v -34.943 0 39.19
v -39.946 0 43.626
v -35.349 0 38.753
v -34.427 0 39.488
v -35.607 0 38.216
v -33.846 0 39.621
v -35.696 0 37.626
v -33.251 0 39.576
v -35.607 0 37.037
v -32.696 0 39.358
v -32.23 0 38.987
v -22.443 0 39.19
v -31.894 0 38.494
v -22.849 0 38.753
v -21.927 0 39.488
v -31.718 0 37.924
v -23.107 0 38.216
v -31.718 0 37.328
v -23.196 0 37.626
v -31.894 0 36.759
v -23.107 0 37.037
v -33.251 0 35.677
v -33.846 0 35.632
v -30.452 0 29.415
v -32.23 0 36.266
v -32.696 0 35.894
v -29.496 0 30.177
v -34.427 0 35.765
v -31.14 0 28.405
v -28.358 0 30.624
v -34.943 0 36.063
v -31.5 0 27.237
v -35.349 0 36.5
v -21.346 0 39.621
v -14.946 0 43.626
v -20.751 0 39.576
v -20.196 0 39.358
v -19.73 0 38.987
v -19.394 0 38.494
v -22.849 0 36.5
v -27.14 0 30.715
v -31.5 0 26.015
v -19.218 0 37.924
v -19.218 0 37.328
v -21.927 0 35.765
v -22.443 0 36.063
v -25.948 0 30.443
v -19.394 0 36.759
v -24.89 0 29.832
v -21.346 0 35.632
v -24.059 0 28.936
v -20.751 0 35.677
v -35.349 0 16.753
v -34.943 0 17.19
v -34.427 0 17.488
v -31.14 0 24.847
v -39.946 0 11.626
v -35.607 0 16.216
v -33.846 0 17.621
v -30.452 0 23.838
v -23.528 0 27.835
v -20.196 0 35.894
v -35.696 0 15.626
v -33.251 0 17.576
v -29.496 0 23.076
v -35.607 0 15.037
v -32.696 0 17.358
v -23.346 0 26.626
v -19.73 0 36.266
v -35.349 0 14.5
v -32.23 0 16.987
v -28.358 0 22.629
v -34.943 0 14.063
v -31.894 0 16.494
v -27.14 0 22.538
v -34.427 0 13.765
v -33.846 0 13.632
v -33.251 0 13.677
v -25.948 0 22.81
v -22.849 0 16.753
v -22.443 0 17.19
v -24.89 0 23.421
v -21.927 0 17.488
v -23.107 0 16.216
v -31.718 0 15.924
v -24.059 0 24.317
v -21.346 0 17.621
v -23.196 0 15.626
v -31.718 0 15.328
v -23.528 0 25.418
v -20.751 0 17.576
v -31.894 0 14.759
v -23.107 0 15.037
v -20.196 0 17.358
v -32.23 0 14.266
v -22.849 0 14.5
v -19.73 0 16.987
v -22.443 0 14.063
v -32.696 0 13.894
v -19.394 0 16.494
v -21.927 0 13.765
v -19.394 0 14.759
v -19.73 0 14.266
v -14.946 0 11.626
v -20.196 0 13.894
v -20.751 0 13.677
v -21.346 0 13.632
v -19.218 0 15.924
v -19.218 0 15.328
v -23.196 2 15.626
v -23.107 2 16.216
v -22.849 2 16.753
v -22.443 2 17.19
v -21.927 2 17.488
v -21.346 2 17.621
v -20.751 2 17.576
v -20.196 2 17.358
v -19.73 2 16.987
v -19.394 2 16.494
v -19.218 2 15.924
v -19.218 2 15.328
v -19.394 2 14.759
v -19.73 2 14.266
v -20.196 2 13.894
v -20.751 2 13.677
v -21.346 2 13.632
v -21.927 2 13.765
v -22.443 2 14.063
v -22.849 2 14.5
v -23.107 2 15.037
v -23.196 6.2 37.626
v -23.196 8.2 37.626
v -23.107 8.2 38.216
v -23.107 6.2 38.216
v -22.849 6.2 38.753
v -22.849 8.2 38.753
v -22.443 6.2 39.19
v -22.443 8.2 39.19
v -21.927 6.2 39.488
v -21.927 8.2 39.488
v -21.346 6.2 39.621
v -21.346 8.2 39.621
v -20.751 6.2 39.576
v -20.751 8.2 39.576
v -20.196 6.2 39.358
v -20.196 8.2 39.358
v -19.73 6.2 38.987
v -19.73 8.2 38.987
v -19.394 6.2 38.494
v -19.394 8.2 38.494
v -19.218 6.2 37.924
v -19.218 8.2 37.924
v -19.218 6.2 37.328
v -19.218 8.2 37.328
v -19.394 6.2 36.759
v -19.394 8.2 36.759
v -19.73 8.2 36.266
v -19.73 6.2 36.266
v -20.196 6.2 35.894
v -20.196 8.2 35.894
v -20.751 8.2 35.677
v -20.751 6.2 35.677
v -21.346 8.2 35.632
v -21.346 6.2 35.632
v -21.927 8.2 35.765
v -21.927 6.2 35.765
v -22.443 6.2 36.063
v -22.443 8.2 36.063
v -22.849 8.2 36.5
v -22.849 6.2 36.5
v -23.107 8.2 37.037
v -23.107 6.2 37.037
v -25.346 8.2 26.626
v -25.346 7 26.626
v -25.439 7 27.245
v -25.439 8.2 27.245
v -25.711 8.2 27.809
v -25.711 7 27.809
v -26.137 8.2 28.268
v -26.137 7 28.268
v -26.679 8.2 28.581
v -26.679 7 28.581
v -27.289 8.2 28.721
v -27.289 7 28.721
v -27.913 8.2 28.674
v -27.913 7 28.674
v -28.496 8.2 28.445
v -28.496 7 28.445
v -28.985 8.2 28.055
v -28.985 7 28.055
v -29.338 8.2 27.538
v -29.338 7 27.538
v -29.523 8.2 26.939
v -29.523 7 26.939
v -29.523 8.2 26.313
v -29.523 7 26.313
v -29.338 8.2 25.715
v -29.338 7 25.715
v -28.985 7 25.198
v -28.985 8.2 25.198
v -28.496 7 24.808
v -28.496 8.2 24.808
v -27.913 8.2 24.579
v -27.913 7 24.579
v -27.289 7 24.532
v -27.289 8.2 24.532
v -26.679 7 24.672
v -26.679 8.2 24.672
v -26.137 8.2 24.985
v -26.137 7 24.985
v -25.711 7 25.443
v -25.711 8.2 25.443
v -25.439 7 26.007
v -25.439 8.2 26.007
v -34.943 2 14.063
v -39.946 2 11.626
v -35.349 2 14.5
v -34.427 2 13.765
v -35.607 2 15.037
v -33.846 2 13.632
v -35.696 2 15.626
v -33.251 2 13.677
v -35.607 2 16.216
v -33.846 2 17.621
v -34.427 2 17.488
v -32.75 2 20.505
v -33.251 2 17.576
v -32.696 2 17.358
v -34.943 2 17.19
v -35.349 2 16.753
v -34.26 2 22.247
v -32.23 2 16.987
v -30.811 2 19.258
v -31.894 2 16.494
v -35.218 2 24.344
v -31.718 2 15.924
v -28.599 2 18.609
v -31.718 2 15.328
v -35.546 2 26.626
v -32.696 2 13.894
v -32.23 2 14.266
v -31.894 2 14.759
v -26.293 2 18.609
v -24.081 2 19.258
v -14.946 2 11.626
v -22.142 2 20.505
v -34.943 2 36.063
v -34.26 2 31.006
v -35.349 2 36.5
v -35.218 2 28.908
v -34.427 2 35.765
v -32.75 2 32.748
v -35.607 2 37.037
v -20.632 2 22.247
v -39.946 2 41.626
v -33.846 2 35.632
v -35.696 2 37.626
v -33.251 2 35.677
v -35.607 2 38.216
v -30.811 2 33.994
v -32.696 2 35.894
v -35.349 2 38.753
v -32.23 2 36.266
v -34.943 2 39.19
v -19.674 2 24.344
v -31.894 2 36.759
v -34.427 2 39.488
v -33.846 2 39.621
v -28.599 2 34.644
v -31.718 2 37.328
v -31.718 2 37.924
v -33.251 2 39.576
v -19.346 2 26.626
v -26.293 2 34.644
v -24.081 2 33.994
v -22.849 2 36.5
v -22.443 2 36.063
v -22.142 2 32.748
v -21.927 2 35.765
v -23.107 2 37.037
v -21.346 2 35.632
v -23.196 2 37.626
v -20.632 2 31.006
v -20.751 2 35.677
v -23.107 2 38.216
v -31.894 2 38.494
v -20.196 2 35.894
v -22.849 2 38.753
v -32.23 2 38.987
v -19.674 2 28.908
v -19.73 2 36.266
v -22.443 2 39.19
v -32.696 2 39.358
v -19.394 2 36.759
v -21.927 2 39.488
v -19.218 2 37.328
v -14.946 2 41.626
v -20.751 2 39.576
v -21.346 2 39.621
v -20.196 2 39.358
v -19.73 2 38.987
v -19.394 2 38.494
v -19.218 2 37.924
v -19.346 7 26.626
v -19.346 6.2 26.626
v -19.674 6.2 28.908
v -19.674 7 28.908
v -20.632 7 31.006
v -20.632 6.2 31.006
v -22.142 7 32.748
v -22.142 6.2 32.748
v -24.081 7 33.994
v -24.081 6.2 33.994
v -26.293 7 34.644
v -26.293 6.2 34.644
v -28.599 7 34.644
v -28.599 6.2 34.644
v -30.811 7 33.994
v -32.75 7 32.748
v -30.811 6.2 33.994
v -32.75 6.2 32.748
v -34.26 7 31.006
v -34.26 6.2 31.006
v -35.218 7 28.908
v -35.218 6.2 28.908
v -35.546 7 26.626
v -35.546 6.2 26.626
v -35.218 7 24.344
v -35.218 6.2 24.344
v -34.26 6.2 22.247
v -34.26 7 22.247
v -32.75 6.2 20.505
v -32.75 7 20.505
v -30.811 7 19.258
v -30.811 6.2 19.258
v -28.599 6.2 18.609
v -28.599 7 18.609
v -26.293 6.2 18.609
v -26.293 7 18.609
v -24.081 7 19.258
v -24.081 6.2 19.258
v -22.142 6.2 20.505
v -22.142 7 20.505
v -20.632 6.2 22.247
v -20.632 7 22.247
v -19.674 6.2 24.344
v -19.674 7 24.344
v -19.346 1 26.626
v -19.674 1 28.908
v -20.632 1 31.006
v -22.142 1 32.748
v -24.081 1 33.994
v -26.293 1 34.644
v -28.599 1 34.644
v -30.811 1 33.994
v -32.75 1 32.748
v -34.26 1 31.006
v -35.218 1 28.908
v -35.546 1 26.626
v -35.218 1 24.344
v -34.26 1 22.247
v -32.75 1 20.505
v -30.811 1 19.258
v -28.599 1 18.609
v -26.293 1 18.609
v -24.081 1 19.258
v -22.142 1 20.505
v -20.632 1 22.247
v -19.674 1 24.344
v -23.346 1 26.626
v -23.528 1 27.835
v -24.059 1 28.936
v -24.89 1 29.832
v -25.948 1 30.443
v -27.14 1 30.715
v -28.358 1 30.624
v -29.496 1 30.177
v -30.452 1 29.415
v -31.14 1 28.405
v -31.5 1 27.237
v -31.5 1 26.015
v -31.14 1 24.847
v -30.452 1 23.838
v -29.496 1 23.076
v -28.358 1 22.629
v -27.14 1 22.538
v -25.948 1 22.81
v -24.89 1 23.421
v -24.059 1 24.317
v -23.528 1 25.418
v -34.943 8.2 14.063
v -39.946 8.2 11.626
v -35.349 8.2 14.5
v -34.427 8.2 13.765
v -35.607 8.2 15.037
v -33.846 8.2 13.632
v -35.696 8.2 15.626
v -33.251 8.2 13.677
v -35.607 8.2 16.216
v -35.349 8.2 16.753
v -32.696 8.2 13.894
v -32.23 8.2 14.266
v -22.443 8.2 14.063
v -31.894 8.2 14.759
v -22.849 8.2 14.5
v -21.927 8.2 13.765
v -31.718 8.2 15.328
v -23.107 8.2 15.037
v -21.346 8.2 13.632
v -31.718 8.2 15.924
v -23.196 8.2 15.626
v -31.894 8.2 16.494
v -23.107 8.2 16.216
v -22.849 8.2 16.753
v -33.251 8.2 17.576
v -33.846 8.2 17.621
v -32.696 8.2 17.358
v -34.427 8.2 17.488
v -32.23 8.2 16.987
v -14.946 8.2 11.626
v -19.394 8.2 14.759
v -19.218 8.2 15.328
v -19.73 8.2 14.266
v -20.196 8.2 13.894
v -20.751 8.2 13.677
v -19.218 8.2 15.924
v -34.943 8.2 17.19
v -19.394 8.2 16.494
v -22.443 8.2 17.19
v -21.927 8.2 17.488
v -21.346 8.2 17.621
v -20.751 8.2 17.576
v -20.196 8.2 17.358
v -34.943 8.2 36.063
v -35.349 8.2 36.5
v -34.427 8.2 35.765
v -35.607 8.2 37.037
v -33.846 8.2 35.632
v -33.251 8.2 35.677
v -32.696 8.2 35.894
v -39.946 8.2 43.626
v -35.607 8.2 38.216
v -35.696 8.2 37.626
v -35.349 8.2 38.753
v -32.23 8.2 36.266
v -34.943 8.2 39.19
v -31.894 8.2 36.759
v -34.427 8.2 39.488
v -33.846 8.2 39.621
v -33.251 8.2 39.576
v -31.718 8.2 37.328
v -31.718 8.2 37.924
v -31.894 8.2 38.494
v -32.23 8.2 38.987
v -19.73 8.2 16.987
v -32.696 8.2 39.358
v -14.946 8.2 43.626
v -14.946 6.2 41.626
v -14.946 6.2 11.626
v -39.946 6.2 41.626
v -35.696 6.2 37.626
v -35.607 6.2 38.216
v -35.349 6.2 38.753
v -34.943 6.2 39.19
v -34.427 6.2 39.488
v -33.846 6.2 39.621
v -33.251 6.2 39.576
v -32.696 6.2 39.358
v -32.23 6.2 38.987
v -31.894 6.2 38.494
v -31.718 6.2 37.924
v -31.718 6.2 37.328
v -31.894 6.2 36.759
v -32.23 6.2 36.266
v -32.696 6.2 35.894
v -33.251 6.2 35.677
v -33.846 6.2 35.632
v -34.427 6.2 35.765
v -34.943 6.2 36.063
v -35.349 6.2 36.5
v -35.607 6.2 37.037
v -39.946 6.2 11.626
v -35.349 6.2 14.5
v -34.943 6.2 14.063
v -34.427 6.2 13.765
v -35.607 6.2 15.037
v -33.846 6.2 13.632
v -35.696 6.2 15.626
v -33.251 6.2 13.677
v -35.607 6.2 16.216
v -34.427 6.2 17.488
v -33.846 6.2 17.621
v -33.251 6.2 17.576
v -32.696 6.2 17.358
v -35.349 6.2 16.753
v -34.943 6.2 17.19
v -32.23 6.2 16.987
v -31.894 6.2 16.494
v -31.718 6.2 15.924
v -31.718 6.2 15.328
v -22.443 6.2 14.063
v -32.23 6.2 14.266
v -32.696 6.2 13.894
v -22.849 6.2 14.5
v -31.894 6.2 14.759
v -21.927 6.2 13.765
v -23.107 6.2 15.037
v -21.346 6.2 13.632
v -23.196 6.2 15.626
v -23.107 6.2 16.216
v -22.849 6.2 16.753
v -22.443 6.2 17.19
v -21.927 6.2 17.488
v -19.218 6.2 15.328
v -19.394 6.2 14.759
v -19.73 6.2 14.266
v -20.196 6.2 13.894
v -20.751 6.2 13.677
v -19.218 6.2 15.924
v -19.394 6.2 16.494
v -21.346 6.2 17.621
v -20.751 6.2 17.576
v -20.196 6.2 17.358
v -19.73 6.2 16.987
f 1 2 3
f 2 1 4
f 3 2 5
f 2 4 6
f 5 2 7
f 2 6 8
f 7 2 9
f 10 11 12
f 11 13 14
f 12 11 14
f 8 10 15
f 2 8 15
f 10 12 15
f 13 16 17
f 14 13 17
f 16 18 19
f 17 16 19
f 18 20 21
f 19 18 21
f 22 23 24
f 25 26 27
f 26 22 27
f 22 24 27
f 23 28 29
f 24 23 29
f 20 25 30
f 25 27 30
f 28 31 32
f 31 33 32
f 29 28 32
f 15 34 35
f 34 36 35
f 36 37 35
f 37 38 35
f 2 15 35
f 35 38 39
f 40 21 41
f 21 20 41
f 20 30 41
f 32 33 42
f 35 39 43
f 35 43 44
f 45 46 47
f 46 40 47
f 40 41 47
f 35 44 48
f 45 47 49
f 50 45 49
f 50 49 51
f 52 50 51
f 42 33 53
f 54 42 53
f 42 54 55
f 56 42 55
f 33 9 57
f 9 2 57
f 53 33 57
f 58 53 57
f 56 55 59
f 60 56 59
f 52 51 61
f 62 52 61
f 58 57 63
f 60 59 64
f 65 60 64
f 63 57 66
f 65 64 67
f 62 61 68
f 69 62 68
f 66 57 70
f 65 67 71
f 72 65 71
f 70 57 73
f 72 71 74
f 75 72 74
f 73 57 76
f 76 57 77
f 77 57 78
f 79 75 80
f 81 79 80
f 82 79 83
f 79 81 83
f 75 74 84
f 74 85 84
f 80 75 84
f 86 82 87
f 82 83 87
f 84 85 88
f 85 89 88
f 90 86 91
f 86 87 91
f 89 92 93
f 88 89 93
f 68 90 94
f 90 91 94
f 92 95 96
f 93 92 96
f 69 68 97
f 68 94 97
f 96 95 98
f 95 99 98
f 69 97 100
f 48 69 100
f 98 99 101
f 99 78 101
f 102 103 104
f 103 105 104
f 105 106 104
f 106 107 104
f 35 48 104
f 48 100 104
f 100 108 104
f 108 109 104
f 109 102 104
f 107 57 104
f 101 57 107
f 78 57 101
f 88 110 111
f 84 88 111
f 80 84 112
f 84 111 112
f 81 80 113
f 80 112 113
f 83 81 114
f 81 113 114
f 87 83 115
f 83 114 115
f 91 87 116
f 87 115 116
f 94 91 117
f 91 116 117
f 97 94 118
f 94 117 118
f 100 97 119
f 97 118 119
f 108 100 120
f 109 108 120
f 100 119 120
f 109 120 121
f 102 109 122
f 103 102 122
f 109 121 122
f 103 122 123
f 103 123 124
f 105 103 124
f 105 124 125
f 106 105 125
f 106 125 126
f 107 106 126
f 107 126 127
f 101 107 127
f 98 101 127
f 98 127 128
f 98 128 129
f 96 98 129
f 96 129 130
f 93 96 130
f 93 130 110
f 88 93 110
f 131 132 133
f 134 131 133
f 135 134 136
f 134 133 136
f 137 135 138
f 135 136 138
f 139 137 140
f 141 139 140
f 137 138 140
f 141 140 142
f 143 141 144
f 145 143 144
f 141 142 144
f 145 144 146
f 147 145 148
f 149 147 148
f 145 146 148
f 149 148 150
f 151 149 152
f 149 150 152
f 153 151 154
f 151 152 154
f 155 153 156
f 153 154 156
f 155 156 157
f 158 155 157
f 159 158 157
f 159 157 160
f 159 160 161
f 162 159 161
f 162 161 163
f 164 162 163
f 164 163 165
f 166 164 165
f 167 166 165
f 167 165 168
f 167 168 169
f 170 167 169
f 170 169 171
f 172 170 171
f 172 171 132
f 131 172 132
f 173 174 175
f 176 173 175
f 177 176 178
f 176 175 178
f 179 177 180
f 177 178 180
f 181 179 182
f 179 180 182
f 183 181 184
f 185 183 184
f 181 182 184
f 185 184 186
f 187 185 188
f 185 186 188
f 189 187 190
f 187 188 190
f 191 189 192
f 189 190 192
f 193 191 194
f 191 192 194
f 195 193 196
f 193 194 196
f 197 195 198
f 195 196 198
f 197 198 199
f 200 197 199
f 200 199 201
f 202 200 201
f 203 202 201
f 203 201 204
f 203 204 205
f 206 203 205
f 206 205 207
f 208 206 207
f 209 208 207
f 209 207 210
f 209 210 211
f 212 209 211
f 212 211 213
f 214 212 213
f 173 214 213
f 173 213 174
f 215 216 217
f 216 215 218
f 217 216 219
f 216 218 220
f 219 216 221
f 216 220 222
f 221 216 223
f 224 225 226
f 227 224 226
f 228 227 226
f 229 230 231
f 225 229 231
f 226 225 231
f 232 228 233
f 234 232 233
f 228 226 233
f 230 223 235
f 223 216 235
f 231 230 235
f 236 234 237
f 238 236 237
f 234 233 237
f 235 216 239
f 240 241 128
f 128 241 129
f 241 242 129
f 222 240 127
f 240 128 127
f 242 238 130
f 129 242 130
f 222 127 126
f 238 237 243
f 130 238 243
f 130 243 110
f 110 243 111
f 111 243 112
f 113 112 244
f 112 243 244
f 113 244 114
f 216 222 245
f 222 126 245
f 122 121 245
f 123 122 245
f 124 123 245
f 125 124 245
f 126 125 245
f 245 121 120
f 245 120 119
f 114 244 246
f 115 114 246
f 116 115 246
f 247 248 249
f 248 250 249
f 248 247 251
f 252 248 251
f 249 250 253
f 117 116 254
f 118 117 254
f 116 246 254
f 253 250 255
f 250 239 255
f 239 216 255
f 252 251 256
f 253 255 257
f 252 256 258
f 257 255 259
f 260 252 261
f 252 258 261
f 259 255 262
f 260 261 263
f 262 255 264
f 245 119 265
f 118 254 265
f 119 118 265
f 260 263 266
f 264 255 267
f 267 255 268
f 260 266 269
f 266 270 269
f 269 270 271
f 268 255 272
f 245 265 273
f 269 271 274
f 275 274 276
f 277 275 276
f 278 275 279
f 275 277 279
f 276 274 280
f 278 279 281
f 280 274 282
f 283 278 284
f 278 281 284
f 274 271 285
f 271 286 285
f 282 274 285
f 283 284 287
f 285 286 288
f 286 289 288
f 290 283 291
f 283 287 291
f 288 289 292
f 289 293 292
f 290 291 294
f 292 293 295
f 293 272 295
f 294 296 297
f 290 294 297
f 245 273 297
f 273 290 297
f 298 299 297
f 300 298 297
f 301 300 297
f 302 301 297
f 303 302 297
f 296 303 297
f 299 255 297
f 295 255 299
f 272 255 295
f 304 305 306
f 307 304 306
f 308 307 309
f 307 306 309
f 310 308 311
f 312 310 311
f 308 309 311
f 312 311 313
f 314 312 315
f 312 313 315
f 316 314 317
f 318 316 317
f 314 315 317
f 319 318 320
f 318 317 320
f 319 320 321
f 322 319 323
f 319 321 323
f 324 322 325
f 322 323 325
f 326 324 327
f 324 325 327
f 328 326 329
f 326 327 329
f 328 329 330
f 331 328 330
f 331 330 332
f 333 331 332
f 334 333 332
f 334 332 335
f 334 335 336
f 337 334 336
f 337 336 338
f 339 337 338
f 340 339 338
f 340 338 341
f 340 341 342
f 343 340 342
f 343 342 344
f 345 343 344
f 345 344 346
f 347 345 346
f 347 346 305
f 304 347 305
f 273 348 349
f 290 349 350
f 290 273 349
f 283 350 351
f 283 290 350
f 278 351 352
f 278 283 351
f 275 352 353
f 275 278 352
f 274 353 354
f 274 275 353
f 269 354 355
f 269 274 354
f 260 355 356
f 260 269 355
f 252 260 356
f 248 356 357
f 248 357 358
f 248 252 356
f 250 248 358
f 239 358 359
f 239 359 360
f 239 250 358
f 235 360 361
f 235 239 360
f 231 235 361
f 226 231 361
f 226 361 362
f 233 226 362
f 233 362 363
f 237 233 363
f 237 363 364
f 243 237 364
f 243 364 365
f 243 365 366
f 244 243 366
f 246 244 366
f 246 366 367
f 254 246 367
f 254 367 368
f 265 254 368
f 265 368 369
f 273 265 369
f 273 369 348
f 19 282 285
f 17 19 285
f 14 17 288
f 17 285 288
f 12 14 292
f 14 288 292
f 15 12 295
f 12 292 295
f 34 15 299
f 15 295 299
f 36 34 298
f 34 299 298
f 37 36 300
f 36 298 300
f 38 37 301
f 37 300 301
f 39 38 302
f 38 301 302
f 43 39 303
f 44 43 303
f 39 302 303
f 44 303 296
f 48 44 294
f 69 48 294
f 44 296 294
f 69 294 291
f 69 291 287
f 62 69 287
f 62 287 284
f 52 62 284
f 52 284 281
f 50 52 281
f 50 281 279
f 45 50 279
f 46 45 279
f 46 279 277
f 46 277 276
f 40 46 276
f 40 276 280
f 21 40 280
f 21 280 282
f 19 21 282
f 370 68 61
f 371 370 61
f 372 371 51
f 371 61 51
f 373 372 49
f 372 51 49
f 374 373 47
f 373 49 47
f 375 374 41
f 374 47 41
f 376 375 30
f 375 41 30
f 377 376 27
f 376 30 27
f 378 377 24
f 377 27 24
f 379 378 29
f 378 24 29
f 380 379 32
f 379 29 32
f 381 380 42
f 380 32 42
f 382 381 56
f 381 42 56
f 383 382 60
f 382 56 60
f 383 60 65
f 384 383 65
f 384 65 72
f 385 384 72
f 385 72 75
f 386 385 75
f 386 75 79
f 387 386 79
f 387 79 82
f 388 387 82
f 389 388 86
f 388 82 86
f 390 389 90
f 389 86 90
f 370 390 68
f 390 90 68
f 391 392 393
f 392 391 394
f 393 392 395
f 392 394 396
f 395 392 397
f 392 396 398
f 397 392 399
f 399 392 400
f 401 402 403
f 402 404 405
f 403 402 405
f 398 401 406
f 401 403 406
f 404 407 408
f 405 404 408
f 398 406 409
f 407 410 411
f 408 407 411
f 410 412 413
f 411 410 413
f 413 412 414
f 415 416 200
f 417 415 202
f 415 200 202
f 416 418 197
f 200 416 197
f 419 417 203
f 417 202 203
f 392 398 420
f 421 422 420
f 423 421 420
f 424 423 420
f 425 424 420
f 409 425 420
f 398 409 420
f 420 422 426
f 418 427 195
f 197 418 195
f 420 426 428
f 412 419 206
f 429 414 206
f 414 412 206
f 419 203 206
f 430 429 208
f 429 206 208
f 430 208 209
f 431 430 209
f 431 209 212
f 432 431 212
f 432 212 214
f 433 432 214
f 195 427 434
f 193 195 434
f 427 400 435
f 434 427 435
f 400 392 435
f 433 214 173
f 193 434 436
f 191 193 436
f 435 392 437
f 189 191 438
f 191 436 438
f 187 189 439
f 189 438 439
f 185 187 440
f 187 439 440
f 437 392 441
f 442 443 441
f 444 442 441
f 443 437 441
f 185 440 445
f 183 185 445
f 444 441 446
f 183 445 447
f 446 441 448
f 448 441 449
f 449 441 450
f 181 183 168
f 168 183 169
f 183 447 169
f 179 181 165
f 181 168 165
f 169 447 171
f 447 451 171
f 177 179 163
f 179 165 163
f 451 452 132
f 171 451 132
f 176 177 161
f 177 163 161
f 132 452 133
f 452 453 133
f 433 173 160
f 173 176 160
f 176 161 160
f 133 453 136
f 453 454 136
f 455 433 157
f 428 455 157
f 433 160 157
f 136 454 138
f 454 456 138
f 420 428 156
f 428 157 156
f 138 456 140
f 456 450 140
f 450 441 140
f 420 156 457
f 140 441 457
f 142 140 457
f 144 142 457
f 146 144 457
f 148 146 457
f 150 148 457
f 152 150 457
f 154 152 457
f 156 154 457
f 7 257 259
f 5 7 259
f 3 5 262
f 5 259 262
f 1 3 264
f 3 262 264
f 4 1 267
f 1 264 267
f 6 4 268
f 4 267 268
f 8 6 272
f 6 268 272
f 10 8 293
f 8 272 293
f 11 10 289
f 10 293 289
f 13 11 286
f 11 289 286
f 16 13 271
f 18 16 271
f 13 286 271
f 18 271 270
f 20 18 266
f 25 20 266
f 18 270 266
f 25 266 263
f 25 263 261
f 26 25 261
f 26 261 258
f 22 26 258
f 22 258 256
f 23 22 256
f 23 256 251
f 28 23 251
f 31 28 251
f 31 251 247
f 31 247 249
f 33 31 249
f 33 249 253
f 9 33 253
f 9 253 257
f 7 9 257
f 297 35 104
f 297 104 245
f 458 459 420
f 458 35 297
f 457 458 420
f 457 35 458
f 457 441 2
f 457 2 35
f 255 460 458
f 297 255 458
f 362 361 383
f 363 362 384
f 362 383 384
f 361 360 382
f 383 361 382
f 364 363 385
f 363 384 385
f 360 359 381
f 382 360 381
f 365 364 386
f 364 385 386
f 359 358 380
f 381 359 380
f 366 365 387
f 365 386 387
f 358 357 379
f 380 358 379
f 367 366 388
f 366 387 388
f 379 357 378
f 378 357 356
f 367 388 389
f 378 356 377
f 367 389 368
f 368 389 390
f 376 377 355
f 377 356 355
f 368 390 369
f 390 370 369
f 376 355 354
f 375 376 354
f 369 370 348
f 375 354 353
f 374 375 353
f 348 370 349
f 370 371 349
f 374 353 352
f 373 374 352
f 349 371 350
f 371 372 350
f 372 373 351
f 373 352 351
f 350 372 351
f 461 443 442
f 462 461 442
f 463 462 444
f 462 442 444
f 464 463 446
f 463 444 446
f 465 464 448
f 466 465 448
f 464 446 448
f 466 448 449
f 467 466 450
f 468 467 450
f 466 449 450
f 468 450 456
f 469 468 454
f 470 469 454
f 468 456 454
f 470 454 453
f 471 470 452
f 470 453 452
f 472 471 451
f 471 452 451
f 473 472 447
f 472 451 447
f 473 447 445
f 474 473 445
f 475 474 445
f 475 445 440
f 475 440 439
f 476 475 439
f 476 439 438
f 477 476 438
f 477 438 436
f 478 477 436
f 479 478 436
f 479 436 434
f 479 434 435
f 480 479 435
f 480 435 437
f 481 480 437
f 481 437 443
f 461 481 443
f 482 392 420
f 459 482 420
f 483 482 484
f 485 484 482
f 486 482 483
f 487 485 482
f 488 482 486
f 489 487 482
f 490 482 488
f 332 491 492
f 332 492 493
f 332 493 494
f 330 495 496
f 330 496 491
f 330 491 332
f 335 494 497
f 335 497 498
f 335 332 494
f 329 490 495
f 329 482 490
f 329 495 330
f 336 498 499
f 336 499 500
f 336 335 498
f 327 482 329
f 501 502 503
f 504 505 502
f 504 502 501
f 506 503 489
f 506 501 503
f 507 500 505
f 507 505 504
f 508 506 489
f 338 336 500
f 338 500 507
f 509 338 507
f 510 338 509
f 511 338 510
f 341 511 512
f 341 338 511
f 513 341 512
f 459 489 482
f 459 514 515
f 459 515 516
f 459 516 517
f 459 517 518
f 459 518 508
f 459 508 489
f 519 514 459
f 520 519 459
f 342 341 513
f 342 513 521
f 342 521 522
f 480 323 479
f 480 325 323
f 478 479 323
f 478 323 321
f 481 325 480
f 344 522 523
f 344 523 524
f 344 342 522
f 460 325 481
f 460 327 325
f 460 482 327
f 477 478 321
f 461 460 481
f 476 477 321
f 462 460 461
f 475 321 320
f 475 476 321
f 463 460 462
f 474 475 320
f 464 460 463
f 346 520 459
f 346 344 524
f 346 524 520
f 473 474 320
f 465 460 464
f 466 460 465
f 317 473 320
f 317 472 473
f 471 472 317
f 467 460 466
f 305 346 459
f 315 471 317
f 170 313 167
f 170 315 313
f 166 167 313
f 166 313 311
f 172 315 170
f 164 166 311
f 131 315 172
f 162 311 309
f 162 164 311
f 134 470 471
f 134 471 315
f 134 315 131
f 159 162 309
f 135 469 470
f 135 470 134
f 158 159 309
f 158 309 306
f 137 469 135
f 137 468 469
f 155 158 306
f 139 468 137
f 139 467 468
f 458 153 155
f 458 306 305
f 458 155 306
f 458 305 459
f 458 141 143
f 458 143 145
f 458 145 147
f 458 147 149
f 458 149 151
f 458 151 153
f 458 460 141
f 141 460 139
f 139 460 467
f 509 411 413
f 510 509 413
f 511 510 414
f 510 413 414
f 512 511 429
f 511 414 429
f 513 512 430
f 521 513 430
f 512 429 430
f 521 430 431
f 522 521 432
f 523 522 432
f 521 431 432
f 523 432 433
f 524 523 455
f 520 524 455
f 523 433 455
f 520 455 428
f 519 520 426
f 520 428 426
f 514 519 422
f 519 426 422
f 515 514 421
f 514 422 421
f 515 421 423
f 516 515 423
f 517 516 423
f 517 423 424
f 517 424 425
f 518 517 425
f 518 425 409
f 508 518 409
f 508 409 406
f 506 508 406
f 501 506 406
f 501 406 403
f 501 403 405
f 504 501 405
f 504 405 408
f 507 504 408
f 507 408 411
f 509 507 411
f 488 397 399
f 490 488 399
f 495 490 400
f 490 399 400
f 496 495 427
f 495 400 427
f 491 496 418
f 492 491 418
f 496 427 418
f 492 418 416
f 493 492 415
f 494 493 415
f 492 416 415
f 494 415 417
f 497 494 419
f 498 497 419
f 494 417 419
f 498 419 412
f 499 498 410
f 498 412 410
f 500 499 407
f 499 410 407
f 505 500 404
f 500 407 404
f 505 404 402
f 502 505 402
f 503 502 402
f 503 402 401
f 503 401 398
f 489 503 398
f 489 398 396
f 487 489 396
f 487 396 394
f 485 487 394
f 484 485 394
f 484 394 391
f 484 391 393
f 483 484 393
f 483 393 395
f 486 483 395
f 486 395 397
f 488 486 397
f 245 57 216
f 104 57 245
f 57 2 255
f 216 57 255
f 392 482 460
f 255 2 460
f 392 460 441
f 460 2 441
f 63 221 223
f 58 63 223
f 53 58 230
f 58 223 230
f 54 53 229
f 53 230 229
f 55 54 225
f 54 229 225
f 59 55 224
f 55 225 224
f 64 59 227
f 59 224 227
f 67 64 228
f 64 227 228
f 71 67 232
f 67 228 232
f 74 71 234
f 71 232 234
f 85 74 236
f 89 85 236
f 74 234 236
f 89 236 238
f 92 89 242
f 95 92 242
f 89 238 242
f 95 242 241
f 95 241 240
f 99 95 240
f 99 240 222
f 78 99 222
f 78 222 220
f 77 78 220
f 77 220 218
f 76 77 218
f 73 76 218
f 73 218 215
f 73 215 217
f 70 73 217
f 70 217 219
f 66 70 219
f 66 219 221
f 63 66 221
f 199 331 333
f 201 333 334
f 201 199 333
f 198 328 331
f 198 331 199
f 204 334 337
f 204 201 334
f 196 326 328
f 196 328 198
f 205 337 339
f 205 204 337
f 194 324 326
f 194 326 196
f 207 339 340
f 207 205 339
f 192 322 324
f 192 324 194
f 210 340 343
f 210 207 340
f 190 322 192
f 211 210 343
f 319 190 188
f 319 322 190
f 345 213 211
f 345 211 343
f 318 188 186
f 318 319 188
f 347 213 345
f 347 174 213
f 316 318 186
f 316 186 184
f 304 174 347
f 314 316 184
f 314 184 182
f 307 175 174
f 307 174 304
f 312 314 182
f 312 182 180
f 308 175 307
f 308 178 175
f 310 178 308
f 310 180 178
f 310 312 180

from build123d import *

# Parameters (mm, degrees)
F0_W          = 25
F0_H          = 30
F0_R          = 2.1
F1_DEPTH      = 2
F2_W          = 25
F2_H          = 2
F2_H_2        = 4.2
F3_DEPTH      = 2
F4_DEPTH      = 30
F5_R          = 2.1
F6_DEPTH      = 8.2
F8_R          = 8.1
F8_R_2        = 2.1
F9_DEPTH      = 2.5
F9_DEPTH_BACK = 3.5
F10_R         = 4.1
F11_DEPTH     = 1
F12_R         = 2
F13_DEPTH     = 8.2


with BuildPart() as f1:
    # F0 (on Front) → F1 (new body)
    with BuildSketch(Plane.XZ):
        with Locations((-27.446082, 26.626395)):
            Rectangle(F0_W, F0_H)
        with Locations((-27.446082, 26.626395)):
            Circle(F0_R, mode=Mode.SUBTRACT)
    extrude(amount=-F1_DEPTH)

    # F2 (on face) → F3 (join)
    with BuildSketch(Plane.XY.offset(41.626395)):
        with Locations((-27.446082, 7.2)):
            Rectangle(F2_W, F2_H)
        with Locations((-27.446082, 4.1)):
            Rectangle(F2_W, F2_H_2)
        with Locations((-27.446082, 1)):
            Rectangle(F2_W, F2_H)
    extrude(amount=F3_DEPTH)

    # F2 (on face) → F4 (join)
    with BuildSketch(Plane.XY.offset(41.626395)):
        with Locations((-27.446082, 7.2)):
            Rectangle(F2_W, F2_H)
    extrude(amount=-F4_DEPTH)

    # F5 (on face) → F6 (cut, through all)
    with BuildSketch(Plane.XZ):
        with Locations((-27.446082, 26.626395)):
            Circle(F5_R)
    extrude(amount=-F6_DEPTH, mode=Mode.SUBTRACT)

    # F8 (on offset) → F9 (cut, two sides)
    with BuildSketch(Plane.XZ.offset(-3.5)) as f9_sk:
        with Locations((-27.446082, 26.626395)):
            Circle(F8_R)
        with Locations((-27.446082, 26.626395)):
            Circle(F8_R_2, mode=Mode.SUBTRACT)
    extrude(amount=F9_DEPTH, mode=Mode.SUBTRACT)
    extrude(f9_sk.sketch, amount=-F9_DEPTH_BACK, mode=Mode.SUBTRACT)

    # F10 (on face) → F11 (cut, through all)
    with BuildSketch(Plane.XZ):
        with Locations((-27.446082, 26.626395)):
            Circle(F10_R)
    extrude(amount=-F11_DEPTH, mode=Mode.SUBTRACT)

    # F12 (on face) → F13 (cut, through all)
    with BuildSketch(Plane(origin=(0, 8.2, 0), x_dir=(-1, 0, 0), z_dir=(0, 1, 0))):
        with Locations((21.196082, 37.626395)):
            Circle(F12_R)
        with Locations((33.696082, 37.626395)):
            Circle(F12_R)
        with Locations((21.196082, 15.626395)):
            Circle(F12_R)
        with Locations((33.696082, 15.626395)):
            Circle(F12_R)
    extrude(amount=-F13_DEPTH, mode=Mode.SUBTRACT)


solid = f1.part
